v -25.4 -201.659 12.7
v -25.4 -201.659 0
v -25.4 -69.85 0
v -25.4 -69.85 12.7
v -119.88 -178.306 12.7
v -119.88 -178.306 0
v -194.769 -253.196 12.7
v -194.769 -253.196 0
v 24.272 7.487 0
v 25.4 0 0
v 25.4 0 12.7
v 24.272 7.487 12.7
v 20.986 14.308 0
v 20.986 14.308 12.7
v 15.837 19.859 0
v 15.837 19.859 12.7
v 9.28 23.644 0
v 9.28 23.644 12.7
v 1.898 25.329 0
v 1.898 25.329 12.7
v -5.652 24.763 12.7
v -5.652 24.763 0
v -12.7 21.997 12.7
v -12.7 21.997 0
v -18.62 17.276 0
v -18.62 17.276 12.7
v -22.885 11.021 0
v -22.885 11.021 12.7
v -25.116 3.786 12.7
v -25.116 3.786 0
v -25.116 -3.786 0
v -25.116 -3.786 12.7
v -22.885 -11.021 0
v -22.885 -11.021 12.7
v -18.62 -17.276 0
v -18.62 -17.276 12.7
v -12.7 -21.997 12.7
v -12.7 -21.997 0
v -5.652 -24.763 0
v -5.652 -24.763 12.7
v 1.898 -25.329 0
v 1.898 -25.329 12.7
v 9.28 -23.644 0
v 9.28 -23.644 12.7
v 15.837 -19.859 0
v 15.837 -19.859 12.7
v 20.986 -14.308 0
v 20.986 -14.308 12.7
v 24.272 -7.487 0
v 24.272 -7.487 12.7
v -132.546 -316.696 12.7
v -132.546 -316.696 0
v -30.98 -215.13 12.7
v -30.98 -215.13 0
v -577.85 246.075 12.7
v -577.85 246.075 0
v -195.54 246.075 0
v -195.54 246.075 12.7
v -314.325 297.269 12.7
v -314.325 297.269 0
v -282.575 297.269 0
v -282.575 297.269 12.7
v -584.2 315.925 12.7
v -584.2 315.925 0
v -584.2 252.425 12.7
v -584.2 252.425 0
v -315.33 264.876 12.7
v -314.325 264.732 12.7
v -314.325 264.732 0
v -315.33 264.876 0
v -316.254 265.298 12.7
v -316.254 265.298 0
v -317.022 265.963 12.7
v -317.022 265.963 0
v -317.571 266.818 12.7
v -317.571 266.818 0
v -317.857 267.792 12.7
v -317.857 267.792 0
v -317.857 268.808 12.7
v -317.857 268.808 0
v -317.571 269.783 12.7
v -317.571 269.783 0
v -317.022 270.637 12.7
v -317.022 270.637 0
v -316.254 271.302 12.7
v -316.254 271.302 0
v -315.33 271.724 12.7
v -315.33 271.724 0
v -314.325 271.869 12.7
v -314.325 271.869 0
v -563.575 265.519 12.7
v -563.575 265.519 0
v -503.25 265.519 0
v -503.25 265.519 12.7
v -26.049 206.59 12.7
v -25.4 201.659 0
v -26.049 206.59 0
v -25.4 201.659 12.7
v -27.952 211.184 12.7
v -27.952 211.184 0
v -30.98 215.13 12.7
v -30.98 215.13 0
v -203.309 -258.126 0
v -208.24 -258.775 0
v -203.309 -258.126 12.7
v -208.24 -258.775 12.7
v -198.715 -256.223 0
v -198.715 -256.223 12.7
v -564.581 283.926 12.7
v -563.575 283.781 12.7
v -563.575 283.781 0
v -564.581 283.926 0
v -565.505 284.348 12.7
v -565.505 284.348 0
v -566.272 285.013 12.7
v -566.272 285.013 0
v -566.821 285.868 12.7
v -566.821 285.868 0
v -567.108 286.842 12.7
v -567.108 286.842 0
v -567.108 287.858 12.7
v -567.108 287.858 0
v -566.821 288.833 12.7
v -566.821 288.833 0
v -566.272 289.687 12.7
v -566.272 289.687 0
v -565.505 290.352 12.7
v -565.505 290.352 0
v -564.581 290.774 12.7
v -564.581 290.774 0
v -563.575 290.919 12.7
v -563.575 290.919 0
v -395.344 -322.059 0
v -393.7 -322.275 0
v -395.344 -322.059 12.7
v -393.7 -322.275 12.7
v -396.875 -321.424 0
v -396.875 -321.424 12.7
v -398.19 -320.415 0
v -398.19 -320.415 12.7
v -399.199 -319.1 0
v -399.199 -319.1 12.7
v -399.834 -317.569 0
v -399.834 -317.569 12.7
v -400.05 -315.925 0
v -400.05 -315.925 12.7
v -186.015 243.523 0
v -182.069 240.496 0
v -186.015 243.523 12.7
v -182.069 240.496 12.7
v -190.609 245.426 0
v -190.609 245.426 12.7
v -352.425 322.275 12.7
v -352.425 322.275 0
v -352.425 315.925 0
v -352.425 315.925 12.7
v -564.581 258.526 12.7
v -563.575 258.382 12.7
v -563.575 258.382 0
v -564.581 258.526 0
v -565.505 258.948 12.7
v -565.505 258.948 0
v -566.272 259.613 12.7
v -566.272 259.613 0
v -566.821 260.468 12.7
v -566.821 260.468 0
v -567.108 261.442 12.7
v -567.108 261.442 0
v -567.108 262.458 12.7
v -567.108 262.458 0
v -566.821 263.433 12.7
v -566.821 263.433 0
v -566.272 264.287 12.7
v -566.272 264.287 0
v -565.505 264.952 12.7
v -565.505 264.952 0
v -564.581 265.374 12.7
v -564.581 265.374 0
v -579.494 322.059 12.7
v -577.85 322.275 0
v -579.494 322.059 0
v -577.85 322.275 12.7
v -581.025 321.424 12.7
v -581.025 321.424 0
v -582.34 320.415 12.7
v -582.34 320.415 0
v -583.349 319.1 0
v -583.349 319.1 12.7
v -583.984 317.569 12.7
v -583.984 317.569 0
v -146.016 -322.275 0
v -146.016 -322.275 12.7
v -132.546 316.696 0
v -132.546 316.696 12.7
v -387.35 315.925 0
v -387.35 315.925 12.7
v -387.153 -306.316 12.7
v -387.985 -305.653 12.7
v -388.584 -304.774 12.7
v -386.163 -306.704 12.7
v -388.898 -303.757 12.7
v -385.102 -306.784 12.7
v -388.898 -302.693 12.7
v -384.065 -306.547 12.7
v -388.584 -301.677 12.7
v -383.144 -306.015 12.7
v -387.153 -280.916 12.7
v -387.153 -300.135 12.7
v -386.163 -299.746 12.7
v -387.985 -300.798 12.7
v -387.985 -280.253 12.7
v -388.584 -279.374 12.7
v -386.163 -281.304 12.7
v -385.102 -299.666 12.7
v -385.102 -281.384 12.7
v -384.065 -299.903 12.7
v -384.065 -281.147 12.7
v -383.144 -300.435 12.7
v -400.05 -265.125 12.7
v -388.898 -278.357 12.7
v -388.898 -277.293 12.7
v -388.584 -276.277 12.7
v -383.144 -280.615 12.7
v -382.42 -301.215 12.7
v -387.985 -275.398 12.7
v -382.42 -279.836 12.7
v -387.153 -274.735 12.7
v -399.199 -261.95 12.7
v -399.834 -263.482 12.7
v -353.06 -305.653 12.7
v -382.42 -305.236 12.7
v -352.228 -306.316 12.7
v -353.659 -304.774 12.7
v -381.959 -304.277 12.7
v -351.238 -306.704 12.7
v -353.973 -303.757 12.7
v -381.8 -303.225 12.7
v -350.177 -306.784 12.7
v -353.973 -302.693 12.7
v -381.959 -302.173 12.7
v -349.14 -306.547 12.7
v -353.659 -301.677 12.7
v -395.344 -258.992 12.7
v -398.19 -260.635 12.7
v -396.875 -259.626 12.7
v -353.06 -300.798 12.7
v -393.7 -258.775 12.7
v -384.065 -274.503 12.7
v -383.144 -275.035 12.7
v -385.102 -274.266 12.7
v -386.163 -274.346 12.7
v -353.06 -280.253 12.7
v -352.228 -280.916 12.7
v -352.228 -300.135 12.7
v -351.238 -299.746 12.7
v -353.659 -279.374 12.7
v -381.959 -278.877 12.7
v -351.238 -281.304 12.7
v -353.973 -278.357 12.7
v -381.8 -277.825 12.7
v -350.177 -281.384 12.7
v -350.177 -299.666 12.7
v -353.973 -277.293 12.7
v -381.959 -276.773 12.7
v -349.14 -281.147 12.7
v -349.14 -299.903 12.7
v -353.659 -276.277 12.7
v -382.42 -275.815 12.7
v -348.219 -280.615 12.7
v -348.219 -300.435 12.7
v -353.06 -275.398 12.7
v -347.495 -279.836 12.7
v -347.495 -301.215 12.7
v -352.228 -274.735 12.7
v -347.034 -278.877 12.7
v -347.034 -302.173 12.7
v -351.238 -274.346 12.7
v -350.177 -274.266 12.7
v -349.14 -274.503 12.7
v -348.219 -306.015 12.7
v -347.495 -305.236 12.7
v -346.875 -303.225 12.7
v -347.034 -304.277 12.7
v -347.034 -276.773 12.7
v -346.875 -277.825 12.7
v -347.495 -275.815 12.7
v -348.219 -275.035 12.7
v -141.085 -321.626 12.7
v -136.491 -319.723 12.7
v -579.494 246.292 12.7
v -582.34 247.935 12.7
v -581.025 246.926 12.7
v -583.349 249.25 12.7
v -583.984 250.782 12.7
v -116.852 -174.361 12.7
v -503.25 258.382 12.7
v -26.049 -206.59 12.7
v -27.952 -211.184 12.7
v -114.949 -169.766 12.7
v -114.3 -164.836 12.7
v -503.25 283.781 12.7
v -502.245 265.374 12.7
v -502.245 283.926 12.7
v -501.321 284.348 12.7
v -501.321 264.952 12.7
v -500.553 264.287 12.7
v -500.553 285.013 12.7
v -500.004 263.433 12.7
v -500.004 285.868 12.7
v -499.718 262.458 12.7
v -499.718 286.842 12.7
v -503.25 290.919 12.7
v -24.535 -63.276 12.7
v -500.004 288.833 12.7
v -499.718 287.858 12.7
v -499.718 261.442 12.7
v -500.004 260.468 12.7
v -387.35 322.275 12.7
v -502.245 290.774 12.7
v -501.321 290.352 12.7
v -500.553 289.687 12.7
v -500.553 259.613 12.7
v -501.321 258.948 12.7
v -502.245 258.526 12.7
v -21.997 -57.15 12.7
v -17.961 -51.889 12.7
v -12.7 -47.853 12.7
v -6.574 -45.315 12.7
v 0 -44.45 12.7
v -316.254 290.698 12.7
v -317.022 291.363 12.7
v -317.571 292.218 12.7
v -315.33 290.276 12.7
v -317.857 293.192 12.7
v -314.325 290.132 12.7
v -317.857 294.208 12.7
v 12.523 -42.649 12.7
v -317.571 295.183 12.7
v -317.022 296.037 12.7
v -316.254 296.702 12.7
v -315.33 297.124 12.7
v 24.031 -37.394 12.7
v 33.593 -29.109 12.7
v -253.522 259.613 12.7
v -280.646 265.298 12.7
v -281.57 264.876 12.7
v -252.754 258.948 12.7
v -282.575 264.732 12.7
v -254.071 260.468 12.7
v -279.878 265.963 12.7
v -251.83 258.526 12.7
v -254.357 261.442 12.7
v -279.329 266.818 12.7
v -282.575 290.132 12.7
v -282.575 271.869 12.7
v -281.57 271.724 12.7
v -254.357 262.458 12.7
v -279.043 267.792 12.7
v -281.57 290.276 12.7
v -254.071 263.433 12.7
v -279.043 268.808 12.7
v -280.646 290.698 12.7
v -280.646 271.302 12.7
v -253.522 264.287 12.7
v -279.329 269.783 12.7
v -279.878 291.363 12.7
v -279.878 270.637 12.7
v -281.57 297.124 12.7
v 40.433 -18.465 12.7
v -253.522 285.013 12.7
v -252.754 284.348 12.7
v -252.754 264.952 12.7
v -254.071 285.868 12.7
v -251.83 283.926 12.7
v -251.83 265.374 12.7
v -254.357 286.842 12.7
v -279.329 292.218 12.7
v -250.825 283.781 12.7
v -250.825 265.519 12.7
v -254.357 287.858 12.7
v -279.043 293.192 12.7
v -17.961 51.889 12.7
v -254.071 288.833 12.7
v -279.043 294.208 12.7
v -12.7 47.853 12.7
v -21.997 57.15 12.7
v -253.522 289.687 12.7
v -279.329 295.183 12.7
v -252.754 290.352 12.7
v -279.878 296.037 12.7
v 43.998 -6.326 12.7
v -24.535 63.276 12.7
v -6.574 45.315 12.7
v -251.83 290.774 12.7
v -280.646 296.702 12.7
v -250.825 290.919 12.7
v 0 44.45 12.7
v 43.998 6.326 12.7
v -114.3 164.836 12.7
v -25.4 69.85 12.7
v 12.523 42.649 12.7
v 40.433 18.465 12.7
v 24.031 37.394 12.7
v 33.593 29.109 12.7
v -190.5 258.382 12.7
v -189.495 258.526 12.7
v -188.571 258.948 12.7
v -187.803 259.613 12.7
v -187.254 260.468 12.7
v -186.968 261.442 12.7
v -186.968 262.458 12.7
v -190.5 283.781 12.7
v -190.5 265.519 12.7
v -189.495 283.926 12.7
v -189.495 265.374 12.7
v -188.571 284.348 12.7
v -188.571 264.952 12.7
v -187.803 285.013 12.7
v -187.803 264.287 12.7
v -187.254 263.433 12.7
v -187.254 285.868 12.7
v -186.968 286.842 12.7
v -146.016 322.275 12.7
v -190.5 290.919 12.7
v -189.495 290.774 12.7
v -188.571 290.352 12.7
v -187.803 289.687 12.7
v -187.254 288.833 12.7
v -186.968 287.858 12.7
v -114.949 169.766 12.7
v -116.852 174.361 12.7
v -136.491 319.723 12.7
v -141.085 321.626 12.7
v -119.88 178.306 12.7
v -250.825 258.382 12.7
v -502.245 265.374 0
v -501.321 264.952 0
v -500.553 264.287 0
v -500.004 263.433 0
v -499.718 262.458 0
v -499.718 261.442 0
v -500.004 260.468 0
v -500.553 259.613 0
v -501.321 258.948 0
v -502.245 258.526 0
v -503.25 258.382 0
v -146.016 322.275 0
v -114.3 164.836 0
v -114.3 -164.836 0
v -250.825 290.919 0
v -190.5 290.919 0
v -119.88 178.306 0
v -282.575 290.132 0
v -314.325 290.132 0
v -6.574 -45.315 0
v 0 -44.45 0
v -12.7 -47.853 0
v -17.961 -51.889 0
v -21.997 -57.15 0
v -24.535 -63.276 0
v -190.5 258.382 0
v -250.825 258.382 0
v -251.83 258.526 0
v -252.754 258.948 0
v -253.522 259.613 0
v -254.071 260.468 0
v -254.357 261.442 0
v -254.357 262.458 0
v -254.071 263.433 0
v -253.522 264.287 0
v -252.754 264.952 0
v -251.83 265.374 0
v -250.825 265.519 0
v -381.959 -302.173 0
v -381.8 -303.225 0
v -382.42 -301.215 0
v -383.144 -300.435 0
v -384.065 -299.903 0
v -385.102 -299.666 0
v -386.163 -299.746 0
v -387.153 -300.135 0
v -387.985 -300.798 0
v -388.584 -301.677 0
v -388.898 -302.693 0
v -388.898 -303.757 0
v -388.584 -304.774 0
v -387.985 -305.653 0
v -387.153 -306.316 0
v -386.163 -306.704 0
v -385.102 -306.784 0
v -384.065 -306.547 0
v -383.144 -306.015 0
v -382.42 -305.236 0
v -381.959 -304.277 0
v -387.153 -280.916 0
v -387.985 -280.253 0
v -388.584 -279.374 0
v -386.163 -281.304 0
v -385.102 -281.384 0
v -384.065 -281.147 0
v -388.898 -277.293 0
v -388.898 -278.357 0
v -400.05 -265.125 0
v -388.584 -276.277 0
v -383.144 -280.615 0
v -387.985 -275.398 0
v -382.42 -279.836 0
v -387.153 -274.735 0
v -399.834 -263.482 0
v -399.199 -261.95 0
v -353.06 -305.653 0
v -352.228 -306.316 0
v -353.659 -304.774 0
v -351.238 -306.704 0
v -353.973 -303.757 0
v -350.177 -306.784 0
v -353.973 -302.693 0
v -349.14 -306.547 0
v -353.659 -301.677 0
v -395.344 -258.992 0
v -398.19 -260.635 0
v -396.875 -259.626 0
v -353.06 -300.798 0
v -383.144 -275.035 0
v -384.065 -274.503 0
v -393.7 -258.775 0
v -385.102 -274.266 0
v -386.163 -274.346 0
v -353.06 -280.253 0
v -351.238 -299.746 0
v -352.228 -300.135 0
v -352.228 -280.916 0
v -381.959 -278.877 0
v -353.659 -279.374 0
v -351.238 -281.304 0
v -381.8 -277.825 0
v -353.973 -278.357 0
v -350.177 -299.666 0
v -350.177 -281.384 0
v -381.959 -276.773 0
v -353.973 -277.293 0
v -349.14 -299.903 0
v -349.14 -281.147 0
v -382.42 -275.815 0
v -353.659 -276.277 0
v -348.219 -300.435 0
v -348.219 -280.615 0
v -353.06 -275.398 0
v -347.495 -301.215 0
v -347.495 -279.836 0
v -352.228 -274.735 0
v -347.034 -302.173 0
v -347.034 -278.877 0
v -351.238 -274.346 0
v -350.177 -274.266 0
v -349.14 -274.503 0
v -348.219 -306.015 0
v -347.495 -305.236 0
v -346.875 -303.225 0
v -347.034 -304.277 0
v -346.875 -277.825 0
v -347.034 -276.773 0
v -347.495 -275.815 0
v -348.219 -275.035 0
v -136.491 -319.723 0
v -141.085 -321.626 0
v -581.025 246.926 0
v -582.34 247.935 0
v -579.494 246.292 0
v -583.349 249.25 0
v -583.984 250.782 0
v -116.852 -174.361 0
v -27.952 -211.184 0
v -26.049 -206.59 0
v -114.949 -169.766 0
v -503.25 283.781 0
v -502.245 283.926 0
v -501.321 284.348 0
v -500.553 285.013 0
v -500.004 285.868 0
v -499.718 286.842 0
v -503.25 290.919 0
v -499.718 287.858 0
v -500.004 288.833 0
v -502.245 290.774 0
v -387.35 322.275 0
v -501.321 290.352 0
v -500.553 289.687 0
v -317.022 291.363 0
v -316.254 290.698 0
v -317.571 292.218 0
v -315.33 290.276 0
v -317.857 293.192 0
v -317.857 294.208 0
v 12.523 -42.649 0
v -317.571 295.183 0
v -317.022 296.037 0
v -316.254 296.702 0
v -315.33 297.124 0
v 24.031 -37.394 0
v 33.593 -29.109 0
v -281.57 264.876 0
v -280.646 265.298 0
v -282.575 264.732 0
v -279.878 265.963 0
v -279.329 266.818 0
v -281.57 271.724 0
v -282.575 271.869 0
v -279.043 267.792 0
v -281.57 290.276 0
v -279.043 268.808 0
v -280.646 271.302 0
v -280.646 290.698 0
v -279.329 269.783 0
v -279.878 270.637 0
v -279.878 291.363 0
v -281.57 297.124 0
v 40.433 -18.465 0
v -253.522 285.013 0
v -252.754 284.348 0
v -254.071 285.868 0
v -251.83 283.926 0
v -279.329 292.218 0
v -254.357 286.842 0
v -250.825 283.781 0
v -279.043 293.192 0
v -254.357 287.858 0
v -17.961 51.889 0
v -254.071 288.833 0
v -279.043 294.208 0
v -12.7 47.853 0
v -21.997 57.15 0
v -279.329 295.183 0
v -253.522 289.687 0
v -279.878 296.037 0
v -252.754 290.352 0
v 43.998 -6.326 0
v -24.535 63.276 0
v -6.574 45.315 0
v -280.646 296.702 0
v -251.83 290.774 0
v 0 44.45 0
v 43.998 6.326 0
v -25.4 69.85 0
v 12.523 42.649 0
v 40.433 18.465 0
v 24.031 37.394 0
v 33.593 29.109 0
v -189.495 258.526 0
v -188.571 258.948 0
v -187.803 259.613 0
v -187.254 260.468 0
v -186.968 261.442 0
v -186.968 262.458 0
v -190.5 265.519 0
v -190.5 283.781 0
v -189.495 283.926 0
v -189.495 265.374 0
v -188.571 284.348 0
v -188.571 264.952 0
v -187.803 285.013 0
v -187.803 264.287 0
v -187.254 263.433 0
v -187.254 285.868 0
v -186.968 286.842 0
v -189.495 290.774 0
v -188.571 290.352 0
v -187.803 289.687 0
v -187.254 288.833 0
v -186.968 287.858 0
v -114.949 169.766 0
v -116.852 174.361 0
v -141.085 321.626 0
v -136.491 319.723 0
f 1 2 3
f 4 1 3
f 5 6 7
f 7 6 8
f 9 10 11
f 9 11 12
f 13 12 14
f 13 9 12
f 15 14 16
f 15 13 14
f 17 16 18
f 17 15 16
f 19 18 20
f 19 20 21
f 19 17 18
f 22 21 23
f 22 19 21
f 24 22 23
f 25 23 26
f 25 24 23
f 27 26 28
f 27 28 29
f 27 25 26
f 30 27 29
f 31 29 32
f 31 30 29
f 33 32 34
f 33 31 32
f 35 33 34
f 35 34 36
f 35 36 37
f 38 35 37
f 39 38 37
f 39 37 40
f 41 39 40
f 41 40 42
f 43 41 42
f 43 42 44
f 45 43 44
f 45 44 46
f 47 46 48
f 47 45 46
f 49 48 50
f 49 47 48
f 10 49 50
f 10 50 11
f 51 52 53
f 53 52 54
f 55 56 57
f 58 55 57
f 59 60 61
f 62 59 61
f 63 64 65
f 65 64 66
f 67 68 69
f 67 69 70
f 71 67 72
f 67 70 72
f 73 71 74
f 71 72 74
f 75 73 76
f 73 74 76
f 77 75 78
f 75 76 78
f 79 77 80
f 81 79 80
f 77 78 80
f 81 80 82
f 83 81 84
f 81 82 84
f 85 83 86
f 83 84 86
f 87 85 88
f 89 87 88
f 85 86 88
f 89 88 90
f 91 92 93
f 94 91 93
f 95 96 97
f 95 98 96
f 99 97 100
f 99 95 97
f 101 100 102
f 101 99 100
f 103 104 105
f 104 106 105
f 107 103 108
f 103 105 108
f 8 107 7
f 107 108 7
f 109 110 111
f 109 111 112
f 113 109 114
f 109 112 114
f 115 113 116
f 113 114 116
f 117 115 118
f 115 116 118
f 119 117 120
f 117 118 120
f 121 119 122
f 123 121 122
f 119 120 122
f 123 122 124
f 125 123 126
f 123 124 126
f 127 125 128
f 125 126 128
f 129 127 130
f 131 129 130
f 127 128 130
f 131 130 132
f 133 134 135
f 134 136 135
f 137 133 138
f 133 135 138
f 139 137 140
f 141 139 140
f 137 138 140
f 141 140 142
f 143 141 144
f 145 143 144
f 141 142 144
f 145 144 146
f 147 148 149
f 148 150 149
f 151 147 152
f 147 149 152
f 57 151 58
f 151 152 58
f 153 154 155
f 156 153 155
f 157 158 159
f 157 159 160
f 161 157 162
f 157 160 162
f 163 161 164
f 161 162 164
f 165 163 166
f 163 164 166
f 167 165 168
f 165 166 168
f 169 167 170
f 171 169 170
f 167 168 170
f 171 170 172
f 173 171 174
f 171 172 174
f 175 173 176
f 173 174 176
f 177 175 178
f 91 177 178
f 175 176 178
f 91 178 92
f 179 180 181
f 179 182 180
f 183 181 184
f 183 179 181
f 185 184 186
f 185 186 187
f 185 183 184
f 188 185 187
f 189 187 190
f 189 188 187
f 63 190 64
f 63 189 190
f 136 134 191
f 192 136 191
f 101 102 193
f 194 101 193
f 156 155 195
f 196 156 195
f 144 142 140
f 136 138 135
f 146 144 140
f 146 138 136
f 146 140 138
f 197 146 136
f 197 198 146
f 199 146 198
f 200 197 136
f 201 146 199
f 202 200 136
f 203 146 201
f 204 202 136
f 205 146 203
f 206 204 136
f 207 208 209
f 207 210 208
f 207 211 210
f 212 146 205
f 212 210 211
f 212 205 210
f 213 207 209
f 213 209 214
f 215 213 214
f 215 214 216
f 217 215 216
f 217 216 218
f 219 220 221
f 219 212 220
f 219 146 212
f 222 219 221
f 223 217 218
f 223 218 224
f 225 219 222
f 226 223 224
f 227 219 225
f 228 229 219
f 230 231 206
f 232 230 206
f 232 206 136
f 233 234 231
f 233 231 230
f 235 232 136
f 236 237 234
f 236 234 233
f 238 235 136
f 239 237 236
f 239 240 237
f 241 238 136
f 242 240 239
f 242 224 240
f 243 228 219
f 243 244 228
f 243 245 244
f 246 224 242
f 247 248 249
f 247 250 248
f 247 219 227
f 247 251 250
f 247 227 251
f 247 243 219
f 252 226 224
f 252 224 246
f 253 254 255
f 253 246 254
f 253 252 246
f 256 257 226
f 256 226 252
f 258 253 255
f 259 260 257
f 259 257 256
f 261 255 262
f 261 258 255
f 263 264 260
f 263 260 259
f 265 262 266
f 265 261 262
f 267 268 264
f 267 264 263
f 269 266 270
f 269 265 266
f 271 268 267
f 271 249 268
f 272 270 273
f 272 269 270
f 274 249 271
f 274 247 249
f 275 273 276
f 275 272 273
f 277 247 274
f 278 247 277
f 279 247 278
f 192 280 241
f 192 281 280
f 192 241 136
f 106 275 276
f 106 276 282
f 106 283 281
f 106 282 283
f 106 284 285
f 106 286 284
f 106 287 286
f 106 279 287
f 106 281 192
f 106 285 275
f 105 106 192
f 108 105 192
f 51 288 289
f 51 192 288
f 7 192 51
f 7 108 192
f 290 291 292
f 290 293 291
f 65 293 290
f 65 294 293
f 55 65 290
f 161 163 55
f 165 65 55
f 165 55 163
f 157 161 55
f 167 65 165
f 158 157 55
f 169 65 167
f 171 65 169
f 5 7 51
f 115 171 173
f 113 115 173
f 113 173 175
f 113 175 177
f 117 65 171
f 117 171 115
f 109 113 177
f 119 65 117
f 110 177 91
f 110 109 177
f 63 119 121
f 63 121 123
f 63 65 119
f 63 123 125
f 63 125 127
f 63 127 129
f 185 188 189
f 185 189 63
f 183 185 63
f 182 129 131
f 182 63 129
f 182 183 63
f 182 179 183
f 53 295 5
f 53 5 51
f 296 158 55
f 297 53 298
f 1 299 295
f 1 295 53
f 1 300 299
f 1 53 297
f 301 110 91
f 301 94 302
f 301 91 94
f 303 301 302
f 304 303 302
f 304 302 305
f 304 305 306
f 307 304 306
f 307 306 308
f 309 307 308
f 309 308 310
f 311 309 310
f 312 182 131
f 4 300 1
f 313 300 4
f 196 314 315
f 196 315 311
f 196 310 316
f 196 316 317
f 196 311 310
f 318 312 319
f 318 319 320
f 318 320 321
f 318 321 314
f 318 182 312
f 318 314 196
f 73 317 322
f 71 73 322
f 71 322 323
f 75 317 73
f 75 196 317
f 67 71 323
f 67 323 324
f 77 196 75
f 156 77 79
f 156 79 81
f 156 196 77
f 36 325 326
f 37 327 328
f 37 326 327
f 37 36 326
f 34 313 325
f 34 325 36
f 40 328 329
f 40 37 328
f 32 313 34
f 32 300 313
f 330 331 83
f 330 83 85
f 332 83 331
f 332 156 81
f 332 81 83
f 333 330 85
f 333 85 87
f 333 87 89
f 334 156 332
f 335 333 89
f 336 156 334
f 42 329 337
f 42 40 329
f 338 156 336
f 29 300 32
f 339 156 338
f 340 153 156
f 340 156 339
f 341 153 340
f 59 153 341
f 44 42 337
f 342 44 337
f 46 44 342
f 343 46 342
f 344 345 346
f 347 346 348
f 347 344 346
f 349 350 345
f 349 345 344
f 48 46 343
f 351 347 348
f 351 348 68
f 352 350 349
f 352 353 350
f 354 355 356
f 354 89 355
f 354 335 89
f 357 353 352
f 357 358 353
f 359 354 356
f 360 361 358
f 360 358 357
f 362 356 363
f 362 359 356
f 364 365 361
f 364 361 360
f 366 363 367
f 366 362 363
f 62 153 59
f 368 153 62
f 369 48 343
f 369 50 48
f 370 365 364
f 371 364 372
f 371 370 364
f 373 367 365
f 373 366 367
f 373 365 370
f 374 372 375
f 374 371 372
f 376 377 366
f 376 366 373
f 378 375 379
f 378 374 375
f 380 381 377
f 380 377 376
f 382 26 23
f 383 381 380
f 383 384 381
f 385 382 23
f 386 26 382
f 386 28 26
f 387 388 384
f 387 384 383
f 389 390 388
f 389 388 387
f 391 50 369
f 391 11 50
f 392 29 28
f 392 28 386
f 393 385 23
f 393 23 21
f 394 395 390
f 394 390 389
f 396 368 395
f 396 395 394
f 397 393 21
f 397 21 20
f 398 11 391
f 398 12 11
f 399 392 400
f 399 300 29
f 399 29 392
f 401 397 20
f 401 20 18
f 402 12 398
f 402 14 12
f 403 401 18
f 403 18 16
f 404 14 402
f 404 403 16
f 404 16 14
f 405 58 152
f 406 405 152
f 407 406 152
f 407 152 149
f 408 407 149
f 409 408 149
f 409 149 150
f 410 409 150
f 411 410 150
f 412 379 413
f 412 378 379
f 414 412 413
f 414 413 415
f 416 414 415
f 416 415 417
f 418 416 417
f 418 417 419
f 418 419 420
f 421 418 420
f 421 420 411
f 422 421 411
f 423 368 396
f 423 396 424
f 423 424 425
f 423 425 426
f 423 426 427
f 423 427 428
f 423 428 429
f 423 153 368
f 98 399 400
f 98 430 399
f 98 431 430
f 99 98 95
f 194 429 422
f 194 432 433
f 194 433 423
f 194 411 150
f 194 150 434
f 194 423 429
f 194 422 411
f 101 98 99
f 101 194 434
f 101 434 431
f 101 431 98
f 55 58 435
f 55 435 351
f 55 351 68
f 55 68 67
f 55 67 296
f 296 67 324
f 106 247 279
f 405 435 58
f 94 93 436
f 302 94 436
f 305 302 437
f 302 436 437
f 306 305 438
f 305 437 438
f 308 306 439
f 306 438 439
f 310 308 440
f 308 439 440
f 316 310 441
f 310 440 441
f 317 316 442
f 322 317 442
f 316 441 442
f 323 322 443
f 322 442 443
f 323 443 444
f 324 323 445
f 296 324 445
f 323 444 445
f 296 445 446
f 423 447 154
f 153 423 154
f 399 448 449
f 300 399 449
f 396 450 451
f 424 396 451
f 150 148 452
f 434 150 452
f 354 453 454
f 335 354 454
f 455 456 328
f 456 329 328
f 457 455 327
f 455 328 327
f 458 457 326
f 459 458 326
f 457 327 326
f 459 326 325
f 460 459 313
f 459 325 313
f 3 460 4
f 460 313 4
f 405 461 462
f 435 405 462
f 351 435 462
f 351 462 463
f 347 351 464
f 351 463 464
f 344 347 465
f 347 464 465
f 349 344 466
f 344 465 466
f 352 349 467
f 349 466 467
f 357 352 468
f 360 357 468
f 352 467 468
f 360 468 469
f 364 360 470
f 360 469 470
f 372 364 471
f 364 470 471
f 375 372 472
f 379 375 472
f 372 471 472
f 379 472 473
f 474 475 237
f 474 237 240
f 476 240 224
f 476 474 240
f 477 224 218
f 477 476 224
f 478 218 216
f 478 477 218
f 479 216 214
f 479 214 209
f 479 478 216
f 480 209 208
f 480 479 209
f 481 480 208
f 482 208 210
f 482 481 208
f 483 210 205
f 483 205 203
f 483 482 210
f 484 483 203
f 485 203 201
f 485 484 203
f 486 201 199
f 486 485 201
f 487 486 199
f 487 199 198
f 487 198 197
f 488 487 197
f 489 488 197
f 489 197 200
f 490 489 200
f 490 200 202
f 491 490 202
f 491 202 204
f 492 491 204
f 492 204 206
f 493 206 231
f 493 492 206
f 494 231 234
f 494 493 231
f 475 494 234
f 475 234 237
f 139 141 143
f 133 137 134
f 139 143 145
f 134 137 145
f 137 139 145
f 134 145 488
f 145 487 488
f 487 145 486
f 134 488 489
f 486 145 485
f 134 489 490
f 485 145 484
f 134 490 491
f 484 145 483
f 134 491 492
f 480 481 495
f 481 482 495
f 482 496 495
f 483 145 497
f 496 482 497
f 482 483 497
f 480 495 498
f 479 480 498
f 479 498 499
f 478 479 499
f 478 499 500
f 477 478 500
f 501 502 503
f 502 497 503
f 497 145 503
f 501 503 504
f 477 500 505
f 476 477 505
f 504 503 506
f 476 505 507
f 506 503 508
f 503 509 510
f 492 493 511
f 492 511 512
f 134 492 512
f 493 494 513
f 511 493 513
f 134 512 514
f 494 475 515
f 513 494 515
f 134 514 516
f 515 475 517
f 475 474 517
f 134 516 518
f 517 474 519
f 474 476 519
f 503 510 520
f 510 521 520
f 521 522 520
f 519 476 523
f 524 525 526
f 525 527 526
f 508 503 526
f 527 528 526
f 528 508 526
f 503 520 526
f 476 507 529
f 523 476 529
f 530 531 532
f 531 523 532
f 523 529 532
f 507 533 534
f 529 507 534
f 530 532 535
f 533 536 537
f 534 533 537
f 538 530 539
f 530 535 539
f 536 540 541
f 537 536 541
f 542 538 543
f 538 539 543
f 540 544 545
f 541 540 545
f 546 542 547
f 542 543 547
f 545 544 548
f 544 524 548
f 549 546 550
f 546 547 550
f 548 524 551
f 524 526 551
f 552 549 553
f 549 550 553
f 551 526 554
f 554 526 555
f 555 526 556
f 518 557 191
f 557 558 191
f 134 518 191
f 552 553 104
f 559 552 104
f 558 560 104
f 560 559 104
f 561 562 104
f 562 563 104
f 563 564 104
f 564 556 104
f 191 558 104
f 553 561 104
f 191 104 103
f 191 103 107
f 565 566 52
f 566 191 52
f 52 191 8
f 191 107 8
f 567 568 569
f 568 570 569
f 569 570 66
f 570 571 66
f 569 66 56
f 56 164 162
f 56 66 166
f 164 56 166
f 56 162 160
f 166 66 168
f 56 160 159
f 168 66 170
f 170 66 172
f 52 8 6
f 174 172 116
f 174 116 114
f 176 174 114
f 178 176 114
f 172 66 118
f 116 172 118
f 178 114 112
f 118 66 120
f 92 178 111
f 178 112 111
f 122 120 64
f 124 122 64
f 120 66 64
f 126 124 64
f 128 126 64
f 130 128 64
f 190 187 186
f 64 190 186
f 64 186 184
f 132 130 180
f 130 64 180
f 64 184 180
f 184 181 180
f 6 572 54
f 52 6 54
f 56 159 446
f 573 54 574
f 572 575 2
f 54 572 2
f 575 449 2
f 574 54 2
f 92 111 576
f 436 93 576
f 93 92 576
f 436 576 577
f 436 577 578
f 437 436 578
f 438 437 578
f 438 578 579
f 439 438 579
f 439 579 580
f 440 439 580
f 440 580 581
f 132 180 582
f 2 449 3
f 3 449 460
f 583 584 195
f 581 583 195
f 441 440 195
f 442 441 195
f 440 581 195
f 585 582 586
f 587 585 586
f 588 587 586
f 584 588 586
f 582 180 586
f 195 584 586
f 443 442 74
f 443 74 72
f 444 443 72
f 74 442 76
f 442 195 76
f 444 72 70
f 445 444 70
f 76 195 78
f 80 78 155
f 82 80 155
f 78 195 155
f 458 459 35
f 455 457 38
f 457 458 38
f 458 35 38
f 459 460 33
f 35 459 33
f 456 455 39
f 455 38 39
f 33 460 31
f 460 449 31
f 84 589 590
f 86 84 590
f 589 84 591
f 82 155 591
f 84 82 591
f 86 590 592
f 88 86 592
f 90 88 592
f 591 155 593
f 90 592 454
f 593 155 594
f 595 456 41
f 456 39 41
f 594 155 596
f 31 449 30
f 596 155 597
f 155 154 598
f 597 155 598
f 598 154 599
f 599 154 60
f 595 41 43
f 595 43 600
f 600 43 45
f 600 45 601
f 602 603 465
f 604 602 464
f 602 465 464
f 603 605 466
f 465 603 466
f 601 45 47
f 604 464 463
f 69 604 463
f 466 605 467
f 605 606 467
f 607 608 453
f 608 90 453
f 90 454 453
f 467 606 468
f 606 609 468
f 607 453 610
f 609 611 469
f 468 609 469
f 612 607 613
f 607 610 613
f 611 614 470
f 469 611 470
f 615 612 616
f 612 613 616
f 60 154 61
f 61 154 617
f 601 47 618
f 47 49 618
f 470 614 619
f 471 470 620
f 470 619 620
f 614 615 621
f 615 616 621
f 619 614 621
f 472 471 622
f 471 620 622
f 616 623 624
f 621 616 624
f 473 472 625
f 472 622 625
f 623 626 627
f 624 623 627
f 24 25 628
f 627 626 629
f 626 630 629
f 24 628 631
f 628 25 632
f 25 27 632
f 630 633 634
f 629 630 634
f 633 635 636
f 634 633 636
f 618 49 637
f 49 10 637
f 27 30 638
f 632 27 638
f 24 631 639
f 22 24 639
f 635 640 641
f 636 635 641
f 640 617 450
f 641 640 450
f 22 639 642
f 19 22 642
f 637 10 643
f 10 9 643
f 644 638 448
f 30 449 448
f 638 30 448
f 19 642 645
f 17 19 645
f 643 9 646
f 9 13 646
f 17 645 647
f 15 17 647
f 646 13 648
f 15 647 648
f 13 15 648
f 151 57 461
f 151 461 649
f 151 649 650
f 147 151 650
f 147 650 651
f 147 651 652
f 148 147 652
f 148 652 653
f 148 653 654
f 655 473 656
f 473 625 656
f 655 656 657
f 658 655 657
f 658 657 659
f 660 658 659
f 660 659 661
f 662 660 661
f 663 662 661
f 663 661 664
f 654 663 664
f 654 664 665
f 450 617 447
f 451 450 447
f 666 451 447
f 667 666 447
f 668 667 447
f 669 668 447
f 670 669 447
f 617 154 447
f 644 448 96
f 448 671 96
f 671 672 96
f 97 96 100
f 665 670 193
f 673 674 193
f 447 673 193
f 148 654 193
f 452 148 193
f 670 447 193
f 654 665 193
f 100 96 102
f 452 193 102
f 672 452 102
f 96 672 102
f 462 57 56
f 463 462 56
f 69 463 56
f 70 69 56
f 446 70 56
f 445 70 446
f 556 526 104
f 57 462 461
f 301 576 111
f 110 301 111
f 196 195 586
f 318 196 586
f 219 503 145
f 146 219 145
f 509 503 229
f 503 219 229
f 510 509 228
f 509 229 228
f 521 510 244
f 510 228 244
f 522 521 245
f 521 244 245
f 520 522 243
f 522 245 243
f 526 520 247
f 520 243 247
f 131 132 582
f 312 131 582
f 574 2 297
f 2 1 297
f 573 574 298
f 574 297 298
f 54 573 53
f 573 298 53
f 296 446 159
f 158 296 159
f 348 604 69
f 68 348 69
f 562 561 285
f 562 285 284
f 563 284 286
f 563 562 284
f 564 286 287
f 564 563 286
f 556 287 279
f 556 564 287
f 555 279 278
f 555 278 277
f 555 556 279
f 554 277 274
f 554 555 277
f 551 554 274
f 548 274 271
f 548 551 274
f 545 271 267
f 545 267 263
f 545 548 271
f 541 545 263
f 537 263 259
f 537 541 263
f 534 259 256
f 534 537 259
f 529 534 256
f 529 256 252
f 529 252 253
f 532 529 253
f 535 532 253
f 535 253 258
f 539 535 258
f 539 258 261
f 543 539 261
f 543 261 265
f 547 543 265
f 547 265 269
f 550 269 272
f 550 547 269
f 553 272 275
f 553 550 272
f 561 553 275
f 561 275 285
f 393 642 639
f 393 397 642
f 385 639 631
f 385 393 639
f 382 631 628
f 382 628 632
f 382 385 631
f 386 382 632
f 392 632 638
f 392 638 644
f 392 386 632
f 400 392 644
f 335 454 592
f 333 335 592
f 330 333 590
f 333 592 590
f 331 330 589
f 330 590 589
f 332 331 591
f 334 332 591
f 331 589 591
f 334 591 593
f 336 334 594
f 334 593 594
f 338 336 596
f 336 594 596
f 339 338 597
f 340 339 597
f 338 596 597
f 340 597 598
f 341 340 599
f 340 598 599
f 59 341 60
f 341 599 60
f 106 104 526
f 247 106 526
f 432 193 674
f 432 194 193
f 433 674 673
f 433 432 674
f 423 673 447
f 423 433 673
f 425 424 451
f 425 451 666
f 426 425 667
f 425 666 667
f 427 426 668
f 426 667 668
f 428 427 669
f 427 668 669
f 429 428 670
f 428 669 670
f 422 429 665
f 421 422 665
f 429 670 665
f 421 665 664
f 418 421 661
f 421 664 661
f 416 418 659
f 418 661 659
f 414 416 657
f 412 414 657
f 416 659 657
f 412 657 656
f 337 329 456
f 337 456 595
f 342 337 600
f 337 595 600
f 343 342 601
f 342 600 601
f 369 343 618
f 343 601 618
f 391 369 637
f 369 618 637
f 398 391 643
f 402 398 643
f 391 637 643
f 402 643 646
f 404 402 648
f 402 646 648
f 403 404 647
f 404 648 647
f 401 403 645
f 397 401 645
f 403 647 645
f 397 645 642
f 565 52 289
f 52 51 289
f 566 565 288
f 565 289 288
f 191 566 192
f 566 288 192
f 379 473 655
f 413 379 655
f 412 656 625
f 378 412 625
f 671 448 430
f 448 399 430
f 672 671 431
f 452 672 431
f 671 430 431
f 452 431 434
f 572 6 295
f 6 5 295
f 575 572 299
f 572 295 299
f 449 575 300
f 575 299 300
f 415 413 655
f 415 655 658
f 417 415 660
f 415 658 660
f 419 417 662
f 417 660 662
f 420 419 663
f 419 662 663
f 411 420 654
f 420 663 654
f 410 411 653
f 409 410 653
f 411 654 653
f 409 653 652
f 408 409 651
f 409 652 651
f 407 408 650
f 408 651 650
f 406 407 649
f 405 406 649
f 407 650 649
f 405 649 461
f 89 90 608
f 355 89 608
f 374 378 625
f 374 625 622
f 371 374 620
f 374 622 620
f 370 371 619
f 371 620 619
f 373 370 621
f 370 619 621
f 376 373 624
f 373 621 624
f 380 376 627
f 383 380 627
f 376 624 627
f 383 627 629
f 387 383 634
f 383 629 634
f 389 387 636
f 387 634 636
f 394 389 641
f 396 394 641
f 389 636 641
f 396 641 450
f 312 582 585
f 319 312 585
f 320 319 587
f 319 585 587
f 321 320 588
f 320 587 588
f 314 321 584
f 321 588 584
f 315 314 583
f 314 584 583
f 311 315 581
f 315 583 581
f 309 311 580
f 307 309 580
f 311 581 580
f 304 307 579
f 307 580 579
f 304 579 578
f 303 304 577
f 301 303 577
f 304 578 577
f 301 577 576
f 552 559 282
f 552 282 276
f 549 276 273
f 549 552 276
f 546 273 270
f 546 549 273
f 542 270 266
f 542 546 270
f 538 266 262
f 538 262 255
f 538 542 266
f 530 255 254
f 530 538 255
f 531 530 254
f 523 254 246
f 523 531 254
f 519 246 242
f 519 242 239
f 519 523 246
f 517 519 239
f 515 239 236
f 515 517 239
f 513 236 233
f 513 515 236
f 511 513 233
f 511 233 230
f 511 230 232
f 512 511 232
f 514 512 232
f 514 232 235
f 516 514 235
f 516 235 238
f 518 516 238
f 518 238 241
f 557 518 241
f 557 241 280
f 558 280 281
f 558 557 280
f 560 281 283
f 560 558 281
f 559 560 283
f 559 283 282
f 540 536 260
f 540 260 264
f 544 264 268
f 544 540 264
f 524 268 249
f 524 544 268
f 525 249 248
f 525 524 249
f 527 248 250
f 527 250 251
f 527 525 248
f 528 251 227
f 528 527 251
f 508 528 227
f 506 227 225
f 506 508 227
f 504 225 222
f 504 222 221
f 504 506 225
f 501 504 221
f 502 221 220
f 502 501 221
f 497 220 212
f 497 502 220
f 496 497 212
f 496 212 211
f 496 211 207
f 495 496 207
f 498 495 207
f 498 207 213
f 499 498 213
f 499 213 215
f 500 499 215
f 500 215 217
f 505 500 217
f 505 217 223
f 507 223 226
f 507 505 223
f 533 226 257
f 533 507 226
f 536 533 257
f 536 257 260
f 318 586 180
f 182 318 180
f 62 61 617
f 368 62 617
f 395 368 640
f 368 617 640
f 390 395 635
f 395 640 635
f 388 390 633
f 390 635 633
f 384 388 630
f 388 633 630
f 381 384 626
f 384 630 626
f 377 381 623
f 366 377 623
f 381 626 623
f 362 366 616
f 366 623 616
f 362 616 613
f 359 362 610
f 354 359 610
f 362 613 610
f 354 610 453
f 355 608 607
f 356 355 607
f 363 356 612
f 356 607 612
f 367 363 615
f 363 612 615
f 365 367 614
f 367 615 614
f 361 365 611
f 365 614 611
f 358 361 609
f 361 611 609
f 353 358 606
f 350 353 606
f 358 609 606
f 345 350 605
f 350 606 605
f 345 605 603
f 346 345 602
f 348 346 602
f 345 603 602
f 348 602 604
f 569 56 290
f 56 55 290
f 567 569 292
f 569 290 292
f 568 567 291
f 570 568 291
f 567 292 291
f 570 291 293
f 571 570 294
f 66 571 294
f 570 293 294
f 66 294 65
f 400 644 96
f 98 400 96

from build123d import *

# Parameters (mm, degrees)
F0_R     = 3.5687
F0_R_2   = 25.4
F1_DEPTH = 12.7
F2_R     = 25.39999
F3_R     = 19.05
F4_R     = 6.35


# Not quite as in the source:
# - a fillet or chamfer is up to 0.001 mm smaller than in the source, because OpenCascade refuses the exact size


with BuildPart() as f1:
    # F0 (on Top) → F1 (new body)
    with BuildSketch(Plane.XY):
        with BuildLine():
            Line((-25.4, -44.45), (0, -44.45))
            ThreePointArc((0, -44.45), (44.45, 0), (0, 44.45))
            Line((0, 44.45), (-25.4, 44.45))
            Line((-25.4, 44.45), (-25.4, 209.55))
            Line((-25.4, 209.55), (-138.1252, 322.2752))
            Line((-138.1252, 322.2752), (-352.425, 322.2752))
            Line((-352.425, 322.2752), (-352.425, 315.9252107143))
            Line((-352.425, 315.9252107143), (-387.35, 315.9252107143))
            Line((-387.35, 315.9252107143), (-387.35, 322.2752))
            Line((-387.35, 322.2752), (-584.2, 322.2752))
            Line((-584.2, 322.2752), (-584.2, 246.0752))
            Line((-584.2, 246.0752), (-187.648785695, 246.0752))
            Line((-187.648785695, 246.0752), (-114.3, 172.726414305))
            Line((-114.3, 172.726414305), (-114.3, -172.726414305))
            Line((-114.3, -172.726414305), (-200.348785695, -258.7752))
            Line((-200.348785695, -258.7752), (-400.05, -258.7752))
            Line((-400.05, -258.7752), (-400.05, -322.2752))
            Line((-400.05, -322.2752), (-138.1252, -322.2752))
            Line((-138.1252, -322.2752), (-25.4, -209.55))
            Line((-25.4, -209.55), (-25.4, -44.45))
        make_face()
        with Locations((-385.3688, -303.2252)):
            Circle(F0_R, mode=Mode.SUBTRACT)
        with Locations((-350.4438, -303.2252)):
            Circle(F0_R, mode=Mode.SUBTRACT)
        with Locations((-385.3688, -277.8252)):
            Circle(F0_R, mode=Mode.SUBTRACT)
        with Locations((-350.4438, -277.8252)):
            Circle(F0_R, mode=Mode.SUBTRACT)
        with BuildLine():
            Line((-503.2502, 258.3815), (-563.5752, 258.3815))
            ThreePointArc((-563.5752, 258.3815), (-567.1439, 261.9502), (-563.5752, 265.5189))
            Line((-563.5752, 265.5189), (-503.2502, 265.5189))
            ThreePointArc((-503.2502, 265.5189), (-499.6815, 261.9502), (-503.2502, 258.3815))
        make_face(mode=Mode.SUBTRACT)
        with BuildLine():
            ThreePointArc((-563.5752, 283.7815), (-567.1439, 287.3502), (-563.5752, 290.9189))
            Line((-563.5752, 290.9189), (-503.2502, 290.9189))
            ThreePointArc((-503.2502, 290.9189), (-499.6815, 287.3502), (-503.2502, 283.7815))
            Line((-503.2502, 283.7815), (-563.5752, 283.7815))
        make_face(mode=Mode.SUBTRACT)
        with BuildLine():
            Line((-282.575, 264.7315), (-314.325, 264.7315))
            ThreePointArc((-314.325, 264.7315), (-317.8937, 268.3002), (-314.325, 271.8689))
            Line((-314.325, 271.8689), (-282.575, 271.8689))
            ThreePointArc((-282.575, 271.8689), (-279.0063, 268.3002), (-282.575, 264.7315))
        make_face(mode=Mode.SUBTRACT)
        with BuildLine():
            Line((-282.575, 290.1315), (-314.325, 290.1315))
            ThreePointArc((-314.325, 290.1315), (-317.8937, 293.7002), (-314.325, 297.2689))
            Line((-314.325, 297.2689), (-282.575, 297.2689))
            ThreePointArc((-282.575, 297.2689), (-279.0063, 293.7002), (-282.575, 290.1315))
        make_face(mode=Mode.SUBTRACT)
        Circle(F0_R_2, mode=Mode.SUBTRACT)
        with BuildLine():
            Line((-190.5, 258.3815), (-250.825, 258.3815))
            ThreePointArc((-250.825, 258.3815), (-254.3937, 261.9502), (-250.825, 265.5189))
            Line((-250.825, 265.5189), (-190.5, 265.5189))
            ThreePointArc((-190.5, 265.5189), (-186.9313, 261.9502), (-190.5, 258.3815))
        make_face(mode=Mode.SUBTRACT)
        with BuildLine():
            ThreePointArc((-250.825, 283.7815), (-254.3937, 287.3502), (-250.825, 290.9189))
            Line((-250.825, 290.9189), (-190.5, 290.9189))
            ThreePointArc((-190.5, 290.9189), (-186.9313, 287.3502), (-190.5, 283.7815))
            Line((-190.5, 283.7815), (-250.825, 283.7815))
        make_face(mode=Mode.SUBTRACT)
    extrude(amount=F1_DEPTH)

    # F2 (radius 25.4 in the source; OpenCascade refuses exactly that, so slightly less here)
    f2_edges = [f1.edges().sort_by_distance(p)[0] for p in [
        (-25.4, -44.45, 6.35),
        (-25.4, 44.45, 6.35),
    ]]
    fillet(f2_edges, radius=F2_R)

    # F3
    f3_edges = [f1.edges().sort_by_distance(p)[0] for p in [
        (-25.4, -209.55, 6.35),
        (-138.1252, -322.2752, 6.35),
        (-25.4, 209.55, 6.35),
        (-138.1252, 322.2752, 6.35),
        (-114.3, 172.726414, 6.35),
        (-187.648786, 246.0752, 6.35),
        (-114.3, -172.726414, 6.35),
        (-200.348786, -258.7752, 6.35),
    ]]
    fillet(f3_edges, radius=F3_R)

    # F4
    f4_edges = [f1.edges().sort_by_distance(p)[0] for p in [
        (-400.05, -258.7752, 6.35),
        (-400.05, -322.2752, 6.35),
        (-584.2, 246.0752, 6.35),
        (-584.2, 322.2752, 6.35),
    ]]
    fillet(f4_edges, radius=F4_R)


solid = f1.part
